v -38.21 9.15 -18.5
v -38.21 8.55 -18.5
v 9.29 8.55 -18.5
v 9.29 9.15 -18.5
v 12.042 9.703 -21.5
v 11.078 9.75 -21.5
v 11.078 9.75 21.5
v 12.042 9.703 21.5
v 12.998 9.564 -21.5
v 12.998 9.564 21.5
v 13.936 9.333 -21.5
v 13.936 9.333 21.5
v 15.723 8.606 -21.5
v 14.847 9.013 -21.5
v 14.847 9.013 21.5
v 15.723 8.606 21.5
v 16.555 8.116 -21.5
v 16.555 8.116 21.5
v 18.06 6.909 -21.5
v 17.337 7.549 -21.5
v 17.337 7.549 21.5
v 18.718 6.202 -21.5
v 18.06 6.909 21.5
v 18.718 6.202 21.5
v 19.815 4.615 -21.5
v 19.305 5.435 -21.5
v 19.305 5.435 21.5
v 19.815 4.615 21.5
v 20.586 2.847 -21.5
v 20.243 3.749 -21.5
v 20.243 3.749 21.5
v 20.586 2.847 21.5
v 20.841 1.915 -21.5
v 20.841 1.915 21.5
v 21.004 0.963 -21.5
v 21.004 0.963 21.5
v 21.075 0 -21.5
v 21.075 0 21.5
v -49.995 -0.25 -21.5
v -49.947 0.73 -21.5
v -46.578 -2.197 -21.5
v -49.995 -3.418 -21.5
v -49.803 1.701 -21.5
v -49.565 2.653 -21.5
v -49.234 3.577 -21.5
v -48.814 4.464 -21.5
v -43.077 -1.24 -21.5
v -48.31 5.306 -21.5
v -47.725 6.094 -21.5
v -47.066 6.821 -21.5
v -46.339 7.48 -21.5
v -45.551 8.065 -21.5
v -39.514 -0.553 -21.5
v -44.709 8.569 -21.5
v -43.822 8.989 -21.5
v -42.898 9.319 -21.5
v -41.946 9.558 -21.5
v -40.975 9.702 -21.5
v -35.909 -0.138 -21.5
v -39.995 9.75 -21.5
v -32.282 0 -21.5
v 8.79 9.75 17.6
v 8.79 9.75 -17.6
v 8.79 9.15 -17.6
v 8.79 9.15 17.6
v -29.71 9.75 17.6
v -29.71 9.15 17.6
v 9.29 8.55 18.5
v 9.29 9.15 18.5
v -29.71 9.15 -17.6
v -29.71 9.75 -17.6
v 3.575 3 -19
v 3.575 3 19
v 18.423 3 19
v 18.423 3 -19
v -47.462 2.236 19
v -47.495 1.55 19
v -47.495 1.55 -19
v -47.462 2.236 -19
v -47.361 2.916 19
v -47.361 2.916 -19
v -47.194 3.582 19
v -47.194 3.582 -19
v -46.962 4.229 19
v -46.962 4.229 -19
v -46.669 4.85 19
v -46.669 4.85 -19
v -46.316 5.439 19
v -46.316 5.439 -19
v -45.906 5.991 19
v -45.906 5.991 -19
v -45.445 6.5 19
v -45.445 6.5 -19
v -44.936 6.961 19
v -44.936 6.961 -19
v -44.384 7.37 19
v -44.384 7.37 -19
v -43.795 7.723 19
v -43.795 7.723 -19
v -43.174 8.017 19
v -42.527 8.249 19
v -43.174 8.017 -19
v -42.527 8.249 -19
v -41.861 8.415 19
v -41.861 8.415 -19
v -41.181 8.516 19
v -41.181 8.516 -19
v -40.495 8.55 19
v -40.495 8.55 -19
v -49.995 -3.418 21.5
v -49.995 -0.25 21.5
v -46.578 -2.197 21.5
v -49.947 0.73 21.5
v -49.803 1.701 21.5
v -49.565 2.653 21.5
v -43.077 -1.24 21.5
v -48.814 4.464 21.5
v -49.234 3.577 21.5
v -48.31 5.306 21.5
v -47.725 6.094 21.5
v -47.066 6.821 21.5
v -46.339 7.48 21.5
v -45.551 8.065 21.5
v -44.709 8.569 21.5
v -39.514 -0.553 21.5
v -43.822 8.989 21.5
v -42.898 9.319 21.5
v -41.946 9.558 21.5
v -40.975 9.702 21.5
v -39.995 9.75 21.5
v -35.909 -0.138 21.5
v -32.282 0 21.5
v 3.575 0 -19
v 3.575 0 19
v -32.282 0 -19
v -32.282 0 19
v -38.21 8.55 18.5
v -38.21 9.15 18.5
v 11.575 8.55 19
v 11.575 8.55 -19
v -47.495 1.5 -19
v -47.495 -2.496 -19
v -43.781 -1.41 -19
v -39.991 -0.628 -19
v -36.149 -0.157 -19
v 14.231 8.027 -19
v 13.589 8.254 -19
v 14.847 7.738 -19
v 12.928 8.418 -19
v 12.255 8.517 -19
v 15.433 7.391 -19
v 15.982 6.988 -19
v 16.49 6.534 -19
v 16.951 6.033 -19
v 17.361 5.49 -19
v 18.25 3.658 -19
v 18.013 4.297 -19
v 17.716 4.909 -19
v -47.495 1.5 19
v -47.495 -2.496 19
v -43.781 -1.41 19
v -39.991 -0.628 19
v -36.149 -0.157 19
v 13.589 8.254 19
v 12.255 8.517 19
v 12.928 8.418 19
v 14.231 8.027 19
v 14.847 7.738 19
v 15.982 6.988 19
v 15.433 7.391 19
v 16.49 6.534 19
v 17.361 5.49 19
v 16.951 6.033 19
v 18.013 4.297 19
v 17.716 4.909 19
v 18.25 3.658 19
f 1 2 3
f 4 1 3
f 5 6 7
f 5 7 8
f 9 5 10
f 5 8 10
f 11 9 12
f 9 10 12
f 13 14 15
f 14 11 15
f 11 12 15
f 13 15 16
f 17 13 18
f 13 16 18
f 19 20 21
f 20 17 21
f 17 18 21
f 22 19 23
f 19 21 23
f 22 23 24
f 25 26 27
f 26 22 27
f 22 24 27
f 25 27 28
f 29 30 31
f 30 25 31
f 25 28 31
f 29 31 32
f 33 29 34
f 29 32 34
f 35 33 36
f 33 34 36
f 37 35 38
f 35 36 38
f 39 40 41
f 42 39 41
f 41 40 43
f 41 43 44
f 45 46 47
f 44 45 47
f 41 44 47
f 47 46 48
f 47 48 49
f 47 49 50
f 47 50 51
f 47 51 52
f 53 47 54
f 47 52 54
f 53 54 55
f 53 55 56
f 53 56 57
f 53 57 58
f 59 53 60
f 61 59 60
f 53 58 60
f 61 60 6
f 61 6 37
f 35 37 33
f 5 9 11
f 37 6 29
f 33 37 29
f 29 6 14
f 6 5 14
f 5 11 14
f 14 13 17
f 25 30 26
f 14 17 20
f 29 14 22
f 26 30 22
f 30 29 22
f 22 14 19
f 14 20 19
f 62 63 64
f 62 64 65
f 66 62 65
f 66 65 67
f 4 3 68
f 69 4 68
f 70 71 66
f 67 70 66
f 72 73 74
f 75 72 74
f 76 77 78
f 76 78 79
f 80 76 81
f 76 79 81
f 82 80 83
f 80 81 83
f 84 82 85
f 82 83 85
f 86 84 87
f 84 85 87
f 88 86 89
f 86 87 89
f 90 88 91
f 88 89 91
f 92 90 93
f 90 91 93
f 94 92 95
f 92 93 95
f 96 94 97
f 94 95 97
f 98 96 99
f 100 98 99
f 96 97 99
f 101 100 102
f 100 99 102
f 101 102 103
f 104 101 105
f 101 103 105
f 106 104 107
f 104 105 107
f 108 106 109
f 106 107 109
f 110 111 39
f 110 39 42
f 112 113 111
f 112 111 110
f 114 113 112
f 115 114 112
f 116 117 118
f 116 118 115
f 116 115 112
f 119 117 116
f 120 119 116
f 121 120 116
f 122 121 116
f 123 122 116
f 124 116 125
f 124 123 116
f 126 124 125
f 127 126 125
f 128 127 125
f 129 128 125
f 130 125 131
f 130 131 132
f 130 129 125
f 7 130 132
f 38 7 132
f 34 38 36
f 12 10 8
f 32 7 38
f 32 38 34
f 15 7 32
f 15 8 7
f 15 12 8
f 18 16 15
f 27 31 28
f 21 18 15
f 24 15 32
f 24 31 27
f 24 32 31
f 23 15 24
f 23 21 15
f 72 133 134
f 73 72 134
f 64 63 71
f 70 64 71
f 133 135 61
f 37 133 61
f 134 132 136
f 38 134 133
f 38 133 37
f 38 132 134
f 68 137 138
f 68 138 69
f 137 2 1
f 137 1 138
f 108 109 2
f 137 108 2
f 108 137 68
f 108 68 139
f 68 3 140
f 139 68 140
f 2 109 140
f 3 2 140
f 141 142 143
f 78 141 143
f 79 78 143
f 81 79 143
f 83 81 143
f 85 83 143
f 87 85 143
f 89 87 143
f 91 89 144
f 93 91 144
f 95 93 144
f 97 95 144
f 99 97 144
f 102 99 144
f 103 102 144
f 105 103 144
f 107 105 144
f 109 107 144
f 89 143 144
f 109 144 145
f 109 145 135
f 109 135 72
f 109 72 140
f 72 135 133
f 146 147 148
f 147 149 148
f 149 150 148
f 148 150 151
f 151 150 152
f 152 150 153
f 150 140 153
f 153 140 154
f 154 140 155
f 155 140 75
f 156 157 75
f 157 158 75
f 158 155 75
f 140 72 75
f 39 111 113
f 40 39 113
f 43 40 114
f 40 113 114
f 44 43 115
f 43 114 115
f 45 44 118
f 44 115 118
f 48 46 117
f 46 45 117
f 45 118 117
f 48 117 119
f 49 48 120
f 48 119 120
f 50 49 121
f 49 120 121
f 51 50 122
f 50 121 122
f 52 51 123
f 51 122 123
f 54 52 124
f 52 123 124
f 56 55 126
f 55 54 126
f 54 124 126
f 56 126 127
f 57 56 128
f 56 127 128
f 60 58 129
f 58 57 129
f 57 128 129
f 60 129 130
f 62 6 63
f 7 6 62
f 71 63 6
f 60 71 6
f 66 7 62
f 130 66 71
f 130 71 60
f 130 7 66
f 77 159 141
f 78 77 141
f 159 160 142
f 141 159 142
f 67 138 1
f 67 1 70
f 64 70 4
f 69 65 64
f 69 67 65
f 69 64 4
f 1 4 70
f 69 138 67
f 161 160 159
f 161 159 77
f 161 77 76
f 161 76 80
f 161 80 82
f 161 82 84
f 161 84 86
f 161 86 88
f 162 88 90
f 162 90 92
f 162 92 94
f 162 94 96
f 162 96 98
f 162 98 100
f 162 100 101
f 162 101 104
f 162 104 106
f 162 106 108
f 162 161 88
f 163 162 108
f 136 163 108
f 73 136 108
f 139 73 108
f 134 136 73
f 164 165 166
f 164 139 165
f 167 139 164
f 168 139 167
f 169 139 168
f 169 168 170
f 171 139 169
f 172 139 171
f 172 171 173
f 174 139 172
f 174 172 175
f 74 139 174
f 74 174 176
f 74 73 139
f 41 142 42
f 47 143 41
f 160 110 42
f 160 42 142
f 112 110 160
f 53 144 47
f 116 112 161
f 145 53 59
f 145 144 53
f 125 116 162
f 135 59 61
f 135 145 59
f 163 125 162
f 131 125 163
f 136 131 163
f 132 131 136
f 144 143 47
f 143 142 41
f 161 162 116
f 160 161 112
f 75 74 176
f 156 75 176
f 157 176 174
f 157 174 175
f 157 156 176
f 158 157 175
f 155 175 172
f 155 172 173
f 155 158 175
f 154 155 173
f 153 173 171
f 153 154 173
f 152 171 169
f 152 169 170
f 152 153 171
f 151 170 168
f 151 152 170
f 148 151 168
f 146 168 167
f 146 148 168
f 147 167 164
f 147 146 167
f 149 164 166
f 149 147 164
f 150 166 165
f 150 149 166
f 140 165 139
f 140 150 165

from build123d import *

# Parameters (mm, degrees)
BOSS_EXTRUDE1_DEPTH = 43
CUT_EXTRUDE1_START  = -8.55
SKETCH3_W           = 66.07
SKETCH3_H           = 38
CUT_EXTRUDE1_DEPTH  = 8.55
SKETCH4_W           = 47.5
SKETCH4_H           = 37
CUT_EXTRUDE2_DEPTH  = 0.6
CUT_EXTRUDE3_REACH  = 57.993
SKETCH5_W           = 38.5
SKETCH5_H           = 35.2
FILLET1_R           = 7
FILLET2_R           = 10
SKETCH6_W           = 0.5
SKETCH6_H           = 38
CUT_EXTRUDE4_DEPTH  = 10
SKETCH7_W           = 14.712909767
SKETCH7_H           = 38
BOSS_EXTRUDE2_DEPTH = 1.5
CUT_EXTRUDE5_REACH  = 57.044
SKETCH8_W           = 14.712909767
SKETCH8_H           = 38
SKETCH9_W           = 15
SKETCH9_H           = 38
BOSS_EXTRUDE3_DEPTH = 3


with BuildPart() as part:
    # Sketch1 → Boss-Extrude1 (new body)
    with BuildSketch(Plane.XY.offset(21.5)):
        with BuildLine():
            Line((21.074737692, 0), (21.074737692, 9.75))
            Line((21.074737692, 9.75), (-49.995262308, 9.75))
            Line((-49.995262308, 9.75), (-49.995262308, -3.418305859))
            ThreePointArc((-49.995262308, -3.418305859), (-41.302219327, -0.862388361), (-32.282352541, 0))
            Line((-32.282352541, 0), (21.074737692, 0))
        make_face()
    extrude(amount=-BOSS_EXTRUDE1_DEPTH)

    # Sketch3 → Cut-Extrude1 (cut)
    with BuildSketch(Plane(origin=(0, 8.55, 0), x_dir=(1, 0, 0), z_dir=(0, 1, 0)).offset(CUT_EXTRUDE1_START)):
        with Locations((-14.460262308, 0)):
            Rectangle(SKETCH3_W, SKETCH3_H)
    extrude(amount=CUT_EXTRUDE1_DEPTH, mode=Mode.SUBTRACT)

    # Sketch4 → Cut-Extrude2 (cut)
    with BuildSketch(Plane.XZ.offset(-8.55)):
        with Locations((-14.460262308, 0)):
            Rectangle(SKETCH4_W, SKETCH4_H)
    extrude(amount=-CUT_EXTRUDE2_DEPTH, mode=Mode.SUBTRACT)

    # Sketch5 → Cut-Extrude3 (cut, up to next)
    with BuildSketch(Plane(origin=(0, 9.75, 0), x_dir=(-1, 0, 0), z_dir=(0, 1, 0)), mode=Mode.PRIVATE) as cut_extrude3_sk1:
        with Locations((10.460262308, 0)):
            Rectangle(SKETCH5_W, SKETCH5_H)
    cut_extrude3_tool1 = extrude(cut_extrude3_sk1.sketch, amount=-CUT_EXTRUDE3_REACH, mode=Mode.PRIVATE) & part.part
    add(cut_extrude3_tool1.solids().sort_by_distance((-10.460262, 9.75, 0))[0], mode=Mode.SUBTRACT)

    # Fillet1
    fillet1_edges = [part.edges().sort_by_distance(p)[0] for p in [
        (18.574737692, 8.55, 0),
        (-47.495262308, 8.55, 0),
    ]]
    fillet(fillet1_edges, radius=FILLET1_R)

    # Fillet2
    # the kernel refuses this fillet: 10 mm, written as the material it takes off along each edge
    with BuildSketch(Plane(origin=(21.074737692, 9.75, 46.492186279), x_dir=(0, -1, 0), z_dir=(0, 0, -1))) as fillet2_piece_1:
        with BuildLine():
            CenterArc((10, 9.996874512), FILLET2_R, 180, 88.567456262)
            Line((0, 9.996874512), (-0.2, 9.996874512))
            Line((-0.2, 9.996874512), (-0.2, 0))
            Line((-0.2, 0), (0, -0.2))
            ThreePointArc((0, -0.2), (4.875, -0.2), (9.745, -0.19993749))
            Line((9.745, -0.19993749), (9.75, 0))
        make_face()
    extrude(amount=92.984372558, mode=Mode.SUBTRACT)
    with BuildSketch(Plane(origin=(-49.995262308, 9.75, 46.5), x_dir=(1, 0, 0), z_dir=(0, 0, -1))) as fillet2_piece_2:
        with BuildLine():
            CenterArc((FILLET2_R, FILLET2_R), FILLET2_R, 180, 90)
            Line((0, FILLET2_R), (-FILLET2_R * 0.02, FILLET2_R))
            Line((-FILLET2_R * 0.02, FILLET2_R), (-FILLET2_R * 0.02, -FILLET2_R * 0.02))
            Line((-FILLET2_R * 0.02, -FILLET2_R * 0.02), (FILLET2_R, -FILLET2_R * 0.02))
            Line((FILLET2_R, -FILLET2_R * 0.02), (FILLET2_R, 0))
        make_face()
    extrude(amount=93, mode=Mode.SUBTRACT)

    # Sketch6 → Cut-Extrude4 (cut)
    with BuildSketch(Plane(origin=(0, 0, 0), x_dir=(1, 0, 0), z_dir=(0, 1, 0))):
        with Locations((-32.532352541, 0)):
            Rectangle(SKETCH6_W, SKETCH6_H)
    extrude(amount=-CUT_EXTRUDE4_DEPTH, mode=Mode.SUBTRACT)

    # Sketch7 → Boss-Extrude2 (add)
    with BuildSketch(Plane(origin=(0, 0, 0), x_dir=(1, 0, 0), z_dir=(0, 1, 0))):
        with Locations((-40.138807425, 0)):
            Rectangle(SKETCH7_W, SKETCH7_H)
    extrude(amount=BOSS_EXTRUDE2_DEPTH)

    # Sketch8 → Cut-Extrude5 (cut, up to next)
    with BuildSketch(Plane(origin=(0, 1.5, 0), x_dir=(1, 0, 0), z_dir=(0, 1, 0)), mode=Mode.PRIVATE) as cut_extrude5_sk1:
        with Locations((-40.138807425, 0)):
            Rectangle(SKETCH8_W, SKETCH8_H)
    cut_extrude5_tool1 = extrude(cut_extrude5_sk1.sketch, amount=-CUT_EXTRUDE5_REACH, mode=Mode.PRIVATE) & part.part
    add(cut_extrude5_tool1.solids().sort_by_distance((-40.138807, 1.5, 0))[0], mode=Mode.SUBTRACT)

    # Sketch9 → Boss-Extrude3 (add)
    with BuildSketch(Plane.XZ):
        with Locations((11.074737692, 0)):
            Rectangle(SKETCH9_W, SKETCH9_H)
    extrude(amount=-BOSS_EXTRUDE3_DEPTH)


solid = part.part
